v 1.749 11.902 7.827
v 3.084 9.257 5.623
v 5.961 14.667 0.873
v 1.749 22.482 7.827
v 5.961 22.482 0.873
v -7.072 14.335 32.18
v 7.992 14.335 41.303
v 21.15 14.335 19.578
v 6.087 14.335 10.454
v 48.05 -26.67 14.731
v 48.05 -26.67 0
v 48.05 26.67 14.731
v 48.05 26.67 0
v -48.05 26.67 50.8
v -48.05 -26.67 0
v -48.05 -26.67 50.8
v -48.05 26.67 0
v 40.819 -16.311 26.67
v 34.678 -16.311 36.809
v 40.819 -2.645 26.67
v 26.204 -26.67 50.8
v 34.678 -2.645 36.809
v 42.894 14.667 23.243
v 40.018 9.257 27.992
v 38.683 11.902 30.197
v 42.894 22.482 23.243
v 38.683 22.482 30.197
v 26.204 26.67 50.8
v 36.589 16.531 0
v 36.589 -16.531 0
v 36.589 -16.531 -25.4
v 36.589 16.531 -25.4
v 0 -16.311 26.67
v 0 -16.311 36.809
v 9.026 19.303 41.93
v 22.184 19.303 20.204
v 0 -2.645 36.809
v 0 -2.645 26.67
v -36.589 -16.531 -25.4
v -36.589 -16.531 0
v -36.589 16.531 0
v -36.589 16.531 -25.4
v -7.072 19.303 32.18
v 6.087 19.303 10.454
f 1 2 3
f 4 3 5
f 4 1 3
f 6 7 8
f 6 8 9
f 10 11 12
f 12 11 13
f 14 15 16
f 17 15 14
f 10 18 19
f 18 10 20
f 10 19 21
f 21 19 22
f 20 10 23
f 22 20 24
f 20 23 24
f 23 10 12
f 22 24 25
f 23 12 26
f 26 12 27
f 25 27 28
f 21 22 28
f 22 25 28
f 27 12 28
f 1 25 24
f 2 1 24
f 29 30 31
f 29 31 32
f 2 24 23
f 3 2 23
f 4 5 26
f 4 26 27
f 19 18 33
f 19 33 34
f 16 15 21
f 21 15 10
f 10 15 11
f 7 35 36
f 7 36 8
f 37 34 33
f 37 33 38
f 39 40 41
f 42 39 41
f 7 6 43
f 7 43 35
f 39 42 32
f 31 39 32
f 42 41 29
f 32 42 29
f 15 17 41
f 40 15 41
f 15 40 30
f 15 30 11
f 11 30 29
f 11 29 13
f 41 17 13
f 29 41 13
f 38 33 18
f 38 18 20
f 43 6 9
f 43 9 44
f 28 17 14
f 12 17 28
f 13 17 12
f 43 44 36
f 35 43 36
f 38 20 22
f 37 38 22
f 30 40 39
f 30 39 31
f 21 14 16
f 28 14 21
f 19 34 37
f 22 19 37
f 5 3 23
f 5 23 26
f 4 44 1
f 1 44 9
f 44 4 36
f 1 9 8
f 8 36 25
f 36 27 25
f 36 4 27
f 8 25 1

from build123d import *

# Parameters (mm, degrees)
F0_W      = 96.10016644
F0_H      = 53.3400028944
F1_DEPTH  = 50.8
F2_W      = 73.1771886349
F2_H      = 33.0619849265
F3_DEPTH  = 25.4
F4_W      = 13.6656195391
F4_H      = 10.1390071213
F5_DEPTH  = 48.05108322
F7_DEPTH  = 53.3410028944
F9_DEPTH  = 43.18
F11_DEPTH = 25.4


with BuildPart() as f1:
    # F0 (on Top) → F1 (new body)
    with BuildSketch(Plane.XY):
        Rectangle(F0_W, F0_H)
    extrude(amount=F1_DEPTH)

    # F2 (on Top) → F3 (join)
    with BuildSketch(Plane.XY):
        Rectangle(F2_W, F2_H)
    extrude(amount=-F3_DEPTH)

    # F4 (on Right) → F5 (cut, through all)
    with BuildSketch(Plane.YZ):
        with Locations((-9.4777684426, 31.7395050079)):
            Rectangle(F4_W, F4_H)
    extrude(amount=F5_DEPTH, mode=Mode.SUBTRACT)

    # F6 (on face) → F7 (cut, through all)
    with BuildSketch(Plane(origin=(0, 26.6700014472, 0), x_dir=(-1, 0, 0), z_dir=(0, 1, 0))):
        Polygon((-48.05008322, 50.8), (-48.05008322, 14.7308725864), (-26.2037906796, 50.8), align=None)
    extrude(amount=-F7_DEPTH, mode=Mode.SUBTRACT)

    # F8 (on face) → F9 (cut)
    with BuildSketch(Plane(origin=(41.6815353707, 0, 25.2456069924), x_dir=(0, 1, 0), z_dir=(0.8553426921, 0, 0.5180626207))):
        Polygon((11.9023136795, 5.7883295231), (9.2573547736, 3.2114295755), (14.6670065658, -2.3410974829), (22.4821474403, -2.3410974829), (22.4821474403, 5.7883295231), align=None)
    extrude(amount=-F9_DEPTH, mode=Mode.SUBTRACT)

    # F10 (on face) → F11 (cut)
    with BuildSketch(Plane(origin=(-2.9987171623, 0, 4.9510053573), x_dir=(0.8553426921, 0, 0.5180626207), z_dir=(0.5180626207, 0, -0.8553426921))):
        Polygon((29.4420253485, -19.3029493093), (28.2331872731, -14.3353175372), (10.6222741306, -14.3353175372), (10.6222741306, -19.3029493093), align=None)
    extrude(amount=-F11_DEPTH, mode=Mode.SUBTRACT)


solid = f1.part
